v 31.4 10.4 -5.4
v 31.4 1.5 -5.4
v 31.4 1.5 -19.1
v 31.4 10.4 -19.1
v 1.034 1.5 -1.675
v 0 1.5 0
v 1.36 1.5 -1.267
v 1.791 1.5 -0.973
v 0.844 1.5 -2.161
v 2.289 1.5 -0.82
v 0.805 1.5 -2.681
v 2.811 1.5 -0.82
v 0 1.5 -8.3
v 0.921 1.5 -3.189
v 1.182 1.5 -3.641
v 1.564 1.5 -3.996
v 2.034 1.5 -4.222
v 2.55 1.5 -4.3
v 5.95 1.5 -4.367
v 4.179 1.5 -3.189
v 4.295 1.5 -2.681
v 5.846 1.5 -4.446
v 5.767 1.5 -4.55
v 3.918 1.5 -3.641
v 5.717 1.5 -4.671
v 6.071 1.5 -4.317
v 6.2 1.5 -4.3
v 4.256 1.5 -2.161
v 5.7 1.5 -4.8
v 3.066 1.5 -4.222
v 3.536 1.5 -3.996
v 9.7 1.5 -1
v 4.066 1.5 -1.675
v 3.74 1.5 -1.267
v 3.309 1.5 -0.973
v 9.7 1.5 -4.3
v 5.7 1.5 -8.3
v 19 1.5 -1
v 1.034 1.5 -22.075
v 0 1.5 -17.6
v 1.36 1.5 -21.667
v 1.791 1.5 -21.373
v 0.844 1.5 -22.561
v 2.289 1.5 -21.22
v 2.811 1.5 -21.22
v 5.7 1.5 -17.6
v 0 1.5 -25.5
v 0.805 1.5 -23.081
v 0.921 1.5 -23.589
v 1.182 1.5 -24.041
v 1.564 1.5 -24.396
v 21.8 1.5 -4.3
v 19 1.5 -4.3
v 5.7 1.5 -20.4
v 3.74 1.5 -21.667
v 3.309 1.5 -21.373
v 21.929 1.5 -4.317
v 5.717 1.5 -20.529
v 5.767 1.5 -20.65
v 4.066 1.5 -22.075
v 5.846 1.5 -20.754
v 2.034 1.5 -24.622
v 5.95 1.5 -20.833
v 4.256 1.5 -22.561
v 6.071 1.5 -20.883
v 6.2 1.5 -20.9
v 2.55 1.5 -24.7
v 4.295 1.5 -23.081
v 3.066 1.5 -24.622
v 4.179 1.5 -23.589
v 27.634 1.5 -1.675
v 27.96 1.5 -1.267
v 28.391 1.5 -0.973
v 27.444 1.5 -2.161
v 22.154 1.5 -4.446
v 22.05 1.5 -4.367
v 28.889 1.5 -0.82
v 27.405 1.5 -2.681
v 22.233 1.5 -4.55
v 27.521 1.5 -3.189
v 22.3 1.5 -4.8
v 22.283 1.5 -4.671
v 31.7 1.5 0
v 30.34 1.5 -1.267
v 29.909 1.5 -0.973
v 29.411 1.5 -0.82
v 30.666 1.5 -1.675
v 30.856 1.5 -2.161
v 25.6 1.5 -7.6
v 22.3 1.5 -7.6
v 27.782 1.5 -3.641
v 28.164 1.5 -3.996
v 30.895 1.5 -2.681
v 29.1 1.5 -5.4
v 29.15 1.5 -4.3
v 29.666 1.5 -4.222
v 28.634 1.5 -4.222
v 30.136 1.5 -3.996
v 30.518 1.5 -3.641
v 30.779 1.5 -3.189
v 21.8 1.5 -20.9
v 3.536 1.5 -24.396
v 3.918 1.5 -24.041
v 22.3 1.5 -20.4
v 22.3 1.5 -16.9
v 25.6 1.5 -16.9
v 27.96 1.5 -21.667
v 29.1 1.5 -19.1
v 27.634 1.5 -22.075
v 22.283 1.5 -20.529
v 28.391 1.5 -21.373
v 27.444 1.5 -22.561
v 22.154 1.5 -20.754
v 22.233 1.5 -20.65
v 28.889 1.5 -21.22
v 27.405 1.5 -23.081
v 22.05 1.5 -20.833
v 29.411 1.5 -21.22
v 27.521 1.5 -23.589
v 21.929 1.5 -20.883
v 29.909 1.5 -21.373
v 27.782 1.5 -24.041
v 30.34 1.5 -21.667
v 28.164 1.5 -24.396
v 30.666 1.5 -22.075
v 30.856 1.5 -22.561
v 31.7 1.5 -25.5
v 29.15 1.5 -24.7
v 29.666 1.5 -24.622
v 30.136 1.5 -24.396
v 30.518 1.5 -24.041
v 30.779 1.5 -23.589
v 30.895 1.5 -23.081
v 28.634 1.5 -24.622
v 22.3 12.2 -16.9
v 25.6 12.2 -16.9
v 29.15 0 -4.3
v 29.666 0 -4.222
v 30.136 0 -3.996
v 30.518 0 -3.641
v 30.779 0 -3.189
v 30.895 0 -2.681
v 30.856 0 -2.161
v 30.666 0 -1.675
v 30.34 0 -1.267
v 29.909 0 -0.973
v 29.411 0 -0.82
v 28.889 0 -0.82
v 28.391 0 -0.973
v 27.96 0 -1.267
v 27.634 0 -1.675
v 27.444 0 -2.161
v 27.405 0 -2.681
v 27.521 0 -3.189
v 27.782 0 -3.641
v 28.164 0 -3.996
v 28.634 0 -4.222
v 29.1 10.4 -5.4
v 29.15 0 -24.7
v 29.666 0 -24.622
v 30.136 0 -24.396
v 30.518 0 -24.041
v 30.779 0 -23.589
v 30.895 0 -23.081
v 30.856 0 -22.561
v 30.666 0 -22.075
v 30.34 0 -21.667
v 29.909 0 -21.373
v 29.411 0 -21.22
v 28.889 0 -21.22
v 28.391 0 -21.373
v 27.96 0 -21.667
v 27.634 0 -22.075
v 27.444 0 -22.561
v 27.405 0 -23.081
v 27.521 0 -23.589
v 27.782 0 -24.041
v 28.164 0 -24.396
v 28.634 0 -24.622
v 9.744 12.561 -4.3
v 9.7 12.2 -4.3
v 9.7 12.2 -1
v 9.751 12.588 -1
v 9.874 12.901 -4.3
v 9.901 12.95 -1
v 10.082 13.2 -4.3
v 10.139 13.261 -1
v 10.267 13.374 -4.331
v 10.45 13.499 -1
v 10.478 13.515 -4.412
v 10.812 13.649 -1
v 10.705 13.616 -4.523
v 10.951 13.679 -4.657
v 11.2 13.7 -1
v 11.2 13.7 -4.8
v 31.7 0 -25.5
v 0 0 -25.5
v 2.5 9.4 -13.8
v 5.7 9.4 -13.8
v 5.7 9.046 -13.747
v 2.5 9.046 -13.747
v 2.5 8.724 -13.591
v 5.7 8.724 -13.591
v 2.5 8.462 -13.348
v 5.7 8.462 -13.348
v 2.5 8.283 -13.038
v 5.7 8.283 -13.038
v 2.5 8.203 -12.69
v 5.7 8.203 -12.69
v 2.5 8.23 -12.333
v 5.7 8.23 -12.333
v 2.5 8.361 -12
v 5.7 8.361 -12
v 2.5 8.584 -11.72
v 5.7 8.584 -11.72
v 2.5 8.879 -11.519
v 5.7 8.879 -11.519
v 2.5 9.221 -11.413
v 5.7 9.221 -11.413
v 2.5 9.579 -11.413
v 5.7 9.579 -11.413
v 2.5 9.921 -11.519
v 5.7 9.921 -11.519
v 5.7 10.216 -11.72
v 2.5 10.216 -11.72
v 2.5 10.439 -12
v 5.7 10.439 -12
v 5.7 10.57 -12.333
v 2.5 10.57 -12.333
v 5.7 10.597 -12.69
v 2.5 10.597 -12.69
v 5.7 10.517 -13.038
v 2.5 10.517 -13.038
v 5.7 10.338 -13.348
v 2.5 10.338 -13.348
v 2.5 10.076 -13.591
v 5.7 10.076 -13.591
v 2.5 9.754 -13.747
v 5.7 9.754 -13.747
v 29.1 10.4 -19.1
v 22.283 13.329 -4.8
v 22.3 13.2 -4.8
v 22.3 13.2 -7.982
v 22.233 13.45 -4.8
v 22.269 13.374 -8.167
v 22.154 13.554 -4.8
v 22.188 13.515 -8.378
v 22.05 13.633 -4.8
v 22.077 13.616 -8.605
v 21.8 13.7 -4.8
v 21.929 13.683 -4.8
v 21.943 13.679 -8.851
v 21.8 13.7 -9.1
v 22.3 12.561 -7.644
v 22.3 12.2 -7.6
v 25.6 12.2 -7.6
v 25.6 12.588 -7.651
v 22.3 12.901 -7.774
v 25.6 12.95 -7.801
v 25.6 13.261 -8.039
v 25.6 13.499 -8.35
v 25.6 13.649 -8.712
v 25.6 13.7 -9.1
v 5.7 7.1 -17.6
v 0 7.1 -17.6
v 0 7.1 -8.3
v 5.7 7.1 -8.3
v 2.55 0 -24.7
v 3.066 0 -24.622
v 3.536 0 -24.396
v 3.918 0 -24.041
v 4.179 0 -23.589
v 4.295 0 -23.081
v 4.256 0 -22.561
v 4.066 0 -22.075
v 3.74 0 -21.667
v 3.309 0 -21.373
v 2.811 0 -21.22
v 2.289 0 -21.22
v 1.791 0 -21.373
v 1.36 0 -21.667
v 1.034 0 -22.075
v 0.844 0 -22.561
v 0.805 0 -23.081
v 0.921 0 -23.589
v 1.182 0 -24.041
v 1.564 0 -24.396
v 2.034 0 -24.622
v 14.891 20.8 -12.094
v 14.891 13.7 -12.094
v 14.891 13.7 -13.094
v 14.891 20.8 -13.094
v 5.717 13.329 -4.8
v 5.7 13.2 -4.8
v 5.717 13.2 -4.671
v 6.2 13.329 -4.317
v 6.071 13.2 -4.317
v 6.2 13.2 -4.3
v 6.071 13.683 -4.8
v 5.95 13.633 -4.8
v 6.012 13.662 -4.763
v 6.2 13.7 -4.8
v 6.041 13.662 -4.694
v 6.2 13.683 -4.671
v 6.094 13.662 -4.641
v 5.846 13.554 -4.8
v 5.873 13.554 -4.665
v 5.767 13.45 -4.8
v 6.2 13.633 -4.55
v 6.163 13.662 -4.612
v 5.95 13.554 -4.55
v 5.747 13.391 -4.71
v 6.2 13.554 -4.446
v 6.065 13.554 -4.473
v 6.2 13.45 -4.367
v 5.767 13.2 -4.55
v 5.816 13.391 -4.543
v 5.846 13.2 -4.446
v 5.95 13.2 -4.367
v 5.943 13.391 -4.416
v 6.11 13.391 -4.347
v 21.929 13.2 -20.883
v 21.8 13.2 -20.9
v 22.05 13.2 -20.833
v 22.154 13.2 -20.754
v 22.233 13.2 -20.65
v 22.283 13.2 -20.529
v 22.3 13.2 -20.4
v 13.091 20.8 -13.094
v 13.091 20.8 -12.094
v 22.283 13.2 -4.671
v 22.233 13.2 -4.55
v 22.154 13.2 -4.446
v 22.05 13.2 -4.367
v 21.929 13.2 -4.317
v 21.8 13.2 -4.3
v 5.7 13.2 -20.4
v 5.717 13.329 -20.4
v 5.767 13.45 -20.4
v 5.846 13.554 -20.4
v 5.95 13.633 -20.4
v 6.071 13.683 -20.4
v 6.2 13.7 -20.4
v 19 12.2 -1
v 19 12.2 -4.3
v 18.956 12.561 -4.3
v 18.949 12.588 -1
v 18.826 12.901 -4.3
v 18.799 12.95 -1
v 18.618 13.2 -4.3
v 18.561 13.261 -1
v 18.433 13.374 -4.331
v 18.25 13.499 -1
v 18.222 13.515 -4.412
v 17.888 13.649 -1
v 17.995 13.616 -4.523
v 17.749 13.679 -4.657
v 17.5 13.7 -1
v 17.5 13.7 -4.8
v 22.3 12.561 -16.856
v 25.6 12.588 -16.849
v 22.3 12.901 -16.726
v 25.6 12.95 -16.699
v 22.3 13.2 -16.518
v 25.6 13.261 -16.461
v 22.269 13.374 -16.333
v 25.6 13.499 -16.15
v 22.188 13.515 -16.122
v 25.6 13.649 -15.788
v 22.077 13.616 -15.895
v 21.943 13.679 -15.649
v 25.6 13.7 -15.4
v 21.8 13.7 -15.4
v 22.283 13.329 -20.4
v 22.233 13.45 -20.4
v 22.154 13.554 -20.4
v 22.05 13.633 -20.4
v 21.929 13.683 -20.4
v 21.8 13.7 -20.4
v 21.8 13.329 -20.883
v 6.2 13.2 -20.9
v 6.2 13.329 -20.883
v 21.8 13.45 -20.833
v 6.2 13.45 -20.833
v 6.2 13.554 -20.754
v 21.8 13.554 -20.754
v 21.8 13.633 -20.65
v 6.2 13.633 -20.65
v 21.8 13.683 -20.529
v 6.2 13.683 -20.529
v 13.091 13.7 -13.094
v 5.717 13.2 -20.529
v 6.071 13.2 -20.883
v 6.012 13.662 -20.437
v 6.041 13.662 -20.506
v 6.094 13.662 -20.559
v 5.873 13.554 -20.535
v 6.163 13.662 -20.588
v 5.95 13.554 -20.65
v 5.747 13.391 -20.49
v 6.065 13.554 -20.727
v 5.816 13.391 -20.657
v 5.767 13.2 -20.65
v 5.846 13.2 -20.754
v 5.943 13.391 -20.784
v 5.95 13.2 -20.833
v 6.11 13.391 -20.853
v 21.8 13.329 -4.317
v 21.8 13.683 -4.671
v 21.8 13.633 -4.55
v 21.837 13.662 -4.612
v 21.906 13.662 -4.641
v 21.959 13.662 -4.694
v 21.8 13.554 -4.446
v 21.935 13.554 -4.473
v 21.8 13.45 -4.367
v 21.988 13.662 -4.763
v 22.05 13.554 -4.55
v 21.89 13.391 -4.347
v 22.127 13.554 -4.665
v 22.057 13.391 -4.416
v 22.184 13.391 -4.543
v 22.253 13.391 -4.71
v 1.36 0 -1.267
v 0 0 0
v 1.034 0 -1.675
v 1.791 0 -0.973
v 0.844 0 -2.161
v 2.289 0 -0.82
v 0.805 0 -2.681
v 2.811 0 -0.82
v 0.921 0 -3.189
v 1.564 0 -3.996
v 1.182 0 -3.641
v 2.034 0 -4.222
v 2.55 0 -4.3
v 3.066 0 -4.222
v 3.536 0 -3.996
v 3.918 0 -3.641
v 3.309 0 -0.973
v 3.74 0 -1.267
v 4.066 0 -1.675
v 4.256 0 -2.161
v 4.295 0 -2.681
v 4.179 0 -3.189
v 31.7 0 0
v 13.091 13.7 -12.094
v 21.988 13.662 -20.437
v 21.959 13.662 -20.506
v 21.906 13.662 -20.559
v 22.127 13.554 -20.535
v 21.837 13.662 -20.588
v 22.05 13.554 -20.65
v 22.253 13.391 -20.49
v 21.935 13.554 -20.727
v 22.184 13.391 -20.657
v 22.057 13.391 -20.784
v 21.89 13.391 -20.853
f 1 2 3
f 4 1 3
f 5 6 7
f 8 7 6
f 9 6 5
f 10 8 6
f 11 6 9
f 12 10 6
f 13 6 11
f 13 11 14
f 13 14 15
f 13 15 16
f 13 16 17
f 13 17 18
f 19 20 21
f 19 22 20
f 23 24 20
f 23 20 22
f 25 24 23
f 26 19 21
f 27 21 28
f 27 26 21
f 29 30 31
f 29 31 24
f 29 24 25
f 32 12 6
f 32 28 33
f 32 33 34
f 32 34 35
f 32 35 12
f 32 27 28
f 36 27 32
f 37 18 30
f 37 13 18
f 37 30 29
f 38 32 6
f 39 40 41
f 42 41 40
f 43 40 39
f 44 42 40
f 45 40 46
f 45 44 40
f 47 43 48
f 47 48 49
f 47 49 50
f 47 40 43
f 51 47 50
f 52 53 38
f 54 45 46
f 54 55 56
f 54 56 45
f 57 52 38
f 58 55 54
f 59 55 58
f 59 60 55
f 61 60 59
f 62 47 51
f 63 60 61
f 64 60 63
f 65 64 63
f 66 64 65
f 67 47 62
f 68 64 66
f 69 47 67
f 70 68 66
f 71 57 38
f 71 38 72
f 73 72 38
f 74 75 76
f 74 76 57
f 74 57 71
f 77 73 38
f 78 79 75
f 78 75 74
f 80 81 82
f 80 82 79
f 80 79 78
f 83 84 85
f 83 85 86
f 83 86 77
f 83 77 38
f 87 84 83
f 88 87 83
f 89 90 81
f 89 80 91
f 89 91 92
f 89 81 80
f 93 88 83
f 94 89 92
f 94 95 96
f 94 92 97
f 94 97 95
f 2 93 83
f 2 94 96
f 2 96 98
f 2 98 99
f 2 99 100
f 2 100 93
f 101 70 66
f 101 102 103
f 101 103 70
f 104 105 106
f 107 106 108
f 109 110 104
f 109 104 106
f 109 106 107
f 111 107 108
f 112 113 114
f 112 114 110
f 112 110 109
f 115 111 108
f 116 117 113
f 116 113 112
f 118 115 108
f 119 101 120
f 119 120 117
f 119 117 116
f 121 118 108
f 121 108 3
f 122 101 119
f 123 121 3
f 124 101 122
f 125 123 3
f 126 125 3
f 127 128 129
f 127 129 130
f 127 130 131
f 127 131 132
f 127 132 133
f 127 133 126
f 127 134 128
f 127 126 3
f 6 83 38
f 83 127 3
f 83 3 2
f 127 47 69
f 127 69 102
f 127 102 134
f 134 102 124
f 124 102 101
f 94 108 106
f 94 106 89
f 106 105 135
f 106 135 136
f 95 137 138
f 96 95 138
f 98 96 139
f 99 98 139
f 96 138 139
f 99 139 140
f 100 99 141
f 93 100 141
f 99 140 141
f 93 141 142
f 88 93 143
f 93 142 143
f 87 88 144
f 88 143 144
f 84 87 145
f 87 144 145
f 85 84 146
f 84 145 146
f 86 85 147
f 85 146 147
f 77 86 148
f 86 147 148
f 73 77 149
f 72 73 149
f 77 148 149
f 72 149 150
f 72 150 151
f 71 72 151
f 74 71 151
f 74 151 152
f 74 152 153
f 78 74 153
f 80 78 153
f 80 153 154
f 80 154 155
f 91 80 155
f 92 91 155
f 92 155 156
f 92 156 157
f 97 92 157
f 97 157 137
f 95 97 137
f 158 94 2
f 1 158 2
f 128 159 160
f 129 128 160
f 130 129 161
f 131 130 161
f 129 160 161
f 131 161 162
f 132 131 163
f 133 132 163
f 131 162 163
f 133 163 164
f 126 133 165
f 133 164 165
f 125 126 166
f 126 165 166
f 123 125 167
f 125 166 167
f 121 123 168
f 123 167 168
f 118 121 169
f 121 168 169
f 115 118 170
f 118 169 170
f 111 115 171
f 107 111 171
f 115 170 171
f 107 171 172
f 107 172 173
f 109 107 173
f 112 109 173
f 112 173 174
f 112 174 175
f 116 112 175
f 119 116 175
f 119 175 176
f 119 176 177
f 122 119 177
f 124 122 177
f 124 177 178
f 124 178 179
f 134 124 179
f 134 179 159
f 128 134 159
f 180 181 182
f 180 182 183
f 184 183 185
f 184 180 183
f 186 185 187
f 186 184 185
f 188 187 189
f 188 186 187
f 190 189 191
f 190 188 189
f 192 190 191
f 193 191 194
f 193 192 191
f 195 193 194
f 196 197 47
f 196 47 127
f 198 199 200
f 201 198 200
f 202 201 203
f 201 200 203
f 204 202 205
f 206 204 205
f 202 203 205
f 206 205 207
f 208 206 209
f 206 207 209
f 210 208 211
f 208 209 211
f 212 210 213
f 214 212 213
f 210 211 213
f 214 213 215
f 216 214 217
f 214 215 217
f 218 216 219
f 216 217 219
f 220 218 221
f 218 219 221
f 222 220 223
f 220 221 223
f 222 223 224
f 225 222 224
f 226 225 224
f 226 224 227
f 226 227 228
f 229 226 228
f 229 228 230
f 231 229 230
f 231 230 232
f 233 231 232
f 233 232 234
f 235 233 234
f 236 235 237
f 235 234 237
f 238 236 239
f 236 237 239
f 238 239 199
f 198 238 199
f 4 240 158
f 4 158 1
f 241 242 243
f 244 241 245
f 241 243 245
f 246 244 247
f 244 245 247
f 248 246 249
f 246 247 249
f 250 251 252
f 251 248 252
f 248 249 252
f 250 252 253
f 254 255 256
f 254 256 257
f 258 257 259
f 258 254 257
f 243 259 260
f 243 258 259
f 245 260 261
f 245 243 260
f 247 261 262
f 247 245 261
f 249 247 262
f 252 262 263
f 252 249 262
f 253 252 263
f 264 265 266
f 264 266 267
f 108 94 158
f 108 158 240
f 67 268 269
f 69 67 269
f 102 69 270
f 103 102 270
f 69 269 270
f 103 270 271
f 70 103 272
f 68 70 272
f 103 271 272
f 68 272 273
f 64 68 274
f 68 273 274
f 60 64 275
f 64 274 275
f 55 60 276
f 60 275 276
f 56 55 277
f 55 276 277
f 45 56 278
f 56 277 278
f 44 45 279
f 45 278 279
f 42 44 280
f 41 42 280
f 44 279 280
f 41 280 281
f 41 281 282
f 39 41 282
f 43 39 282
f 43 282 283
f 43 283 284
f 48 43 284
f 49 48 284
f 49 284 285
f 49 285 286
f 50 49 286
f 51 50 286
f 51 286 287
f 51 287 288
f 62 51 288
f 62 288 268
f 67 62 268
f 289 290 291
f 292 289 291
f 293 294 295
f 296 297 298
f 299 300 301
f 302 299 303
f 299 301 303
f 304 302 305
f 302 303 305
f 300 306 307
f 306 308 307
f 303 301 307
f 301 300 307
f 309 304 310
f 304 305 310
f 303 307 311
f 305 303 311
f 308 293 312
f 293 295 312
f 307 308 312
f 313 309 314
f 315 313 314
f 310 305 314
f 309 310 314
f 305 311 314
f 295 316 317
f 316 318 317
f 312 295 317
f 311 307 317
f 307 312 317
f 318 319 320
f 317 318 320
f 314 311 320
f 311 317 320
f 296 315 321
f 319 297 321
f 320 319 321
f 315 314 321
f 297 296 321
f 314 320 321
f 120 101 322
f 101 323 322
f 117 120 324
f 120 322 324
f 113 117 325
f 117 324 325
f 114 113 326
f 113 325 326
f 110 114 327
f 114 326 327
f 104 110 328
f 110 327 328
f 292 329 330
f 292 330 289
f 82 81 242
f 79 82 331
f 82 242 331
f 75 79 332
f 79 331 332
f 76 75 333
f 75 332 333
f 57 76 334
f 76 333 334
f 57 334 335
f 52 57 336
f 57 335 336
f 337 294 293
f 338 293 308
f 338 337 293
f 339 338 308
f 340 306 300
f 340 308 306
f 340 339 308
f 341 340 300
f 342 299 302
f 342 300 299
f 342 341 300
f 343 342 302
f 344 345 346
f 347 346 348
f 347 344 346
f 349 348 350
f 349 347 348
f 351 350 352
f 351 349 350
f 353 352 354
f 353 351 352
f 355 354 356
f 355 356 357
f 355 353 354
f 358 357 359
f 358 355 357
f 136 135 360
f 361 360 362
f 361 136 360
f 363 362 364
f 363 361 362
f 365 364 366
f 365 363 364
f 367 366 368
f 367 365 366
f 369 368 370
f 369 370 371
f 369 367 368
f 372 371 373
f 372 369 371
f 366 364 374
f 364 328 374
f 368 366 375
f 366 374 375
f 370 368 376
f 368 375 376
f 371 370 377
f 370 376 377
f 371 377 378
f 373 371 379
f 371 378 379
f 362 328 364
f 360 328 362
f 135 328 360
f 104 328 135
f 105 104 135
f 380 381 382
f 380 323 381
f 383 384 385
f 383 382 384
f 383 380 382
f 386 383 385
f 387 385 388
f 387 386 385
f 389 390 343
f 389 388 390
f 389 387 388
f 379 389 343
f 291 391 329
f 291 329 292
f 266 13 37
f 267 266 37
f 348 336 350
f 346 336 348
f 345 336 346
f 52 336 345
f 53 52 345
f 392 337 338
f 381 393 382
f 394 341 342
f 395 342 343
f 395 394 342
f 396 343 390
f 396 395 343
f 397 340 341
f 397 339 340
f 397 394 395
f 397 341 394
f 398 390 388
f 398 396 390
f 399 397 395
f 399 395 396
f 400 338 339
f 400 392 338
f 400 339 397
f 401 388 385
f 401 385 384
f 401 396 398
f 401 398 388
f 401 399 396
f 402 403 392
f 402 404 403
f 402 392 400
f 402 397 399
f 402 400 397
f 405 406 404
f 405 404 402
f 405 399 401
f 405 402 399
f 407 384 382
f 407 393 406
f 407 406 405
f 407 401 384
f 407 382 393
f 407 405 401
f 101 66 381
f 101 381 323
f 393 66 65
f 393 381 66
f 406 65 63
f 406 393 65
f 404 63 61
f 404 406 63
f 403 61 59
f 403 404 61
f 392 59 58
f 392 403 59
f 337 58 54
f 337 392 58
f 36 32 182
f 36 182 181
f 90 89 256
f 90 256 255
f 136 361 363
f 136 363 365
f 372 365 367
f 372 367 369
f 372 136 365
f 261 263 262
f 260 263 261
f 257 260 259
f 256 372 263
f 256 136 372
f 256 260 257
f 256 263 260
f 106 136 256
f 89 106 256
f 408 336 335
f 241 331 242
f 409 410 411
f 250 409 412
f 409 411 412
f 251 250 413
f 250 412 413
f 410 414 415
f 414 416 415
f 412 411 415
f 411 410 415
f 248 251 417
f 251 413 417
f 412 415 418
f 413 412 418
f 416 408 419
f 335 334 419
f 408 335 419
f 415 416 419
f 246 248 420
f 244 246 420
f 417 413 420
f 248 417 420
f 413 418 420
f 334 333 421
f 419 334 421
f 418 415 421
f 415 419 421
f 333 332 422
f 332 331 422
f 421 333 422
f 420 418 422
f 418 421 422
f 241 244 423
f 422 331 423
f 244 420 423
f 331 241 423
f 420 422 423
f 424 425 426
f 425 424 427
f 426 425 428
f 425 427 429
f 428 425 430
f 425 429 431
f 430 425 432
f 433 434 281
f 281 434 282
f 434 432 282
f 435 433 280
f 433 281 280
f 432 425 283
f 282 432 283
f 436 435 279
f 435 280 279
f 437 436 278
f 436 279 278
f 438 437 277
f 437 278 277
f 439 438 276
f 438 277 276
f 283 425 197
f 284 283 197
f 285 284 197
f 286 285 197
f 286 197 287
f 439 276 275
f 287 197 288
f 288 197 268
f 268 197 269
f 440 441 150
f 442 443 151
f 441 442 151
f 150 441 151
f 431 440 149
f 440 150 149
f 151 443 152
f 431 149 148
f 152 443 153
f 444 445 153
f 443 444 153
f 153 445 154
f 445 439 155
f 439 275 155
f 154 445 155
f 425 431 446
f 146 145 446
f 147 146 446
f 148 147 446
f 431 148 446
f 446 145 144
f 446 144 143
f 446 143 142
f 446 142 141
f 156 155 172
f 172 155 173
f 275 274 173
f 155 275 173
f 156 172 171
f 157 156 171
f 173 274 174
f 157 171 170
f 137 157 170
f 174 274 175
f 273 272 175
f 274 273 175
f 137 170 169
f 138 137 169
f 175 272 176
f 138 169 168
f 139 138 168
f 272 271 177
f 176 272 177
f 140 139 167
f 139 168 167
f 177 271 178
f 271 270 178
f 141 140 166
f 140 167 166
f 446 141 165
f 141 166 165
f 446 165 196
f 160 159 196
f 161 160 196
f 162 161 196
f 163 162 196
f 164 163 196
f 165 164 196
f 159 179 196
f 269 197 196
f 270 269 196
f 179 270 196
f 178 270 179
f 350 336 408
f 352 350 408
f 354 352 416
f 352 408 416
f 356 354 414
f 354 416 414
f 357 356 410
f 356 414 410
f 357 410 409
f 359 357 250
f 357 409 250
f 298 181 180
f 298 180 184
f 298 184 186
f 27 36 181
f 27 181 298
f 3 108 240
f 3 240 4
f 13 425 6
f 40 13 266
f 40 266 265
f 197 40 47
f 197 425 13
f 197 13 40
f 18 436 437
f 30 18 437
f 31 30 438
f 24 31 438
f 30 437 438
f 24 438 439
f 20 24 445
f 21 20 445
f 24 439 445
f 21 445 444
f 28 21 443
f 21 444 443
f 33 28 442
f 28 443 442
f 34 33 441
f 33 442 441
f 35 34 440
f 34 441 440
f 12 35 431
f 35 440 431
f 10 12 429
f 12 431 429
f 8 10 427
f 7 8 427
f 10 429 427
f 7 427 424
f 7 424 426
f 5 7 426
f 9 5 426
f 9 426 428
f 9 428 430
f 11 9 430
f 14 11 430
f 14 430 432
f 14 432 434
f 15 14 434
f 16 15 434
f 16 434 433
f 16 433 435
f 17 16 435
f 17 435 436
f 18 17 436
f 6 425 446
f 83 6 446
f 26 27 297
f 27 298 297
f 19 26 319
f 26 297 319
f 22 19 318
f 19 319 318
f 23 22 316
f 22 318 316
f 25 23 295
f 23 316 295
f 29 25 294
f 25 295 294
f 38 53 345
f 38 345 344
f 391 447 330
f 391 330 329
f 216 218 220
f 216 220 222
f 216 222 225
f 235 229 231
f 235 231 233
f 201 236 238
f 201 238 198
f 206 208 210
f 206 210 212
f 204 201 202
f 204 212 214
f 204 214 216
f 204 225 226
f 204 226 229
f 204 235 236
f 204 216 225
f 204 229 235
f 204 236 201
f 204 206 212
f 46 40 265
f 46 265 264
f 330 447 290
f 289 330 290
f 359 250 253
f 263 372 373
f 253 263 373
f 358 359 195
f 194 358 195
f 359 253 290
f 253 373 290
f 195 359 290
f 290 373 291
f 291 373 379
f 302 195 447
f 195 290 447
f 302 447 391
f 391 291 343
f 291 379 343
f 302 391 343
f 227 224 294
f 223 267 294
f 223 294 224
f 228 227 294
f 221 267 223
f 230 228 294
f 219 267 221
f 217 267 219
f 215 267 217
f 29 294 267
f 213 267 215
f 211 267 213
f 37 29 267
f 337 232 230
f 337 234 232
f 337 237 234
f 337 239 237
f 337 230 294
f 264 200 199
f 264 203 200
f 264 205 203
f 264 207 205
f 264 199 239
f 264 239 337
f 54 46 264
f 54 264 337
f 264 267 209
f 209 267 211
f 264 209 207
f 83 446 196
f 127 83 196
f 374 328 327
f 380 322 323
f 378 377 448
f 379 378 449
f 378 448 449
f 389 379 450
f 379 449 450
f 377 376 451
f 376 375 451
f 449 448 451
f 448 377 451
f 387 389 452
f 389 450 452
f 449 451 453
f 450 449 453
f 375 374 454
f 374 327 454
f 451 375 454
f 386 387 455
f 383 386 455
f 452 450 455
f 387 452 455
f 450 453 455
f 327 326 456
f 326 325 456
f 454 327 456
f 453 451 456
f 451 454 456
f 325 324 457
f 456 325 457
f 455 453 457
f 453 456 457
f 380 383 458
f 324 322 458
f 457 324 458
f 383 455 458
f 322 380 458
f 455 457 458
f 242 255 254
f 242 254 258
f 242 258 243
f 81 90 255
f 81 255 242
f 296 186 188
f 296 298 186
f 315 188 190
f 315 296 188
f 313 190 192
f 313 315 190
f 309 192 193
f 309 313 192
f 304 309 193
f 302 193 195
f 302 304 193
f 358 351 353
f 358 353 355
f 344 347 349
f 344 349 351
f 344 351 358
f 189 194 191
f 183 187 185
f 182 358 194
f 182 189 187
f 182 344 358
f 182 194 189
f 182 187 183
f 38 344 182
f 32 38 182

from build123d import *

# Parameters (mm, degrees)
SKETCH1_W                       = 31.7
SKETCH1_H                       = 25.5
BOSS_EXTRUDE1_DEPTH             = 1.5
F_3_0MM_DOWEL_HOLE1_D           = 3.5
F_3_0MM_DOWEL_HOLE1_ON_FACE_2_D = 3.5
BOSS_EXTRUDE2_DEPTH             = 12.2
SKETCH5_W                       = 2.3
SKETCH5_H                       = 13.7
BOSS_EXTRUDE3_DEPTH             = 8.9
SKETCH6_W                       = 5.7
SKETCH6_H                       = 9.3
BOSS_EXTRUDE4_DEPTH             = 5.6
SKETCH7_R                       = 1.2
BOSS_EXTRUDE5_DEPTH             = 3.2
FILLET2_R                       = 1.5
FILLET1_R                       = 0.5
SKETCH8_W                       = 1.8
SKETCH8_H                       = 1
BOSS_EXTRUDE6_DEPTH             = 7.1


with BuildPart() as part:
    # Sketch1 → Boss-Extrude1 (new body)
    with BuildSketch(Plane(origin=(0, 0, 0), x_dir=(1, 0, 0), z_dir=(0, 1, 0))):
        with Locations((15.85, 12.75)):
            Rectangle(SKETCH1_W, SKETCH1_H)
    extrude(amount=BOSS_EXTRUDE1_DEPTH)

    # Ø3.0mm Dowel Hole1 (through all)
    with Locations(Plane(origin=(2.55, 1.5, -22.95), x_dir=(0, 0, 1), z_dir=(0, 1, 0))):
        with Locations((0, 0), (0, 26.6), (20.4, 26.6), (20.4, 0)):
            Hole(F_3_0MM_DOWEL_HOLE1_D / 2)

    # Ø3.0mm Dowel Hole1 on face 2 (through all)
    with Locations(Plane(origin=(39.661564938, 0, -26.520963617), x_dir=(0, 0, 1), z_dir=(0, 1, 0))):
        with Locations((0, 0)):
            Hole(F_3_0MM_DOWEL_HOLE1_ON_FACE_2_D / 2)

    # Sketch4 → Boss-Extrude2 (add)
    with BuildSketch(Plane(origin=(0, 1.5, 0), x_dir=(1, 0, 0), z_dir=(0, 1, 0))):
        Polygon((5.7, 20.9), (22.3, 20.9), (22.3, 16.9), (25.6, 16.9), (25.6, 7.6), (22.3, 7.6), (22.3, 4.3), (19, 4.3), (19, 1), (9.7, 1), (9.7, 4.3), (5.7, 4.3), align=None)
    extrude(amount=BOSS_EXTRUDE2_DEPTH)

    # Sketch5 → Boss-Extrude3 (add)
    with BuildSketch(Plane(origin=(0, 1.5, 0), x_dir=(1, 0, 0), z_dir=(0, 1, 0))):
        with Locations((30.25, 12.25)):
            Rectangle(SKETCH5_W, SKETCH5_H)
    extrude(amount=BOSS_EXTRUDE3_DEPTH)

    # Sketch6 → Boss-Extrude4 (add)
    with BuildSketch(Plane(origin=(0, 1.5, 0), x_dir=(1, 0, 0), z_dir=(0, 1, 0))):
        with Locations((2.85, 12.95)):
            Rectangle(SKETCH6_W, SKETCH6_H)
    extrude(amount=BOSS_EXTRUDE4_DEPTH)

    # Sketch7 → Boss-Extrude5 (add)
    with BuildSketch(Plane.ZY.offset(-5.7)):
        with Locations(Location((-12.6, 9.4, 0), (0, 0, 180))):
            Circle(SKETCH7_R)
    extrude(amount=BOSS_EXTRUDE5_DEPTH)

    # Fillet2
    fillet2_edges = [part.edges().sort_by_distance(p)[0] for p in [
        (9.7, 13.7, -2.65),
        (19, 13.7, -2.65),
        (23.95, 13.7, -7.6),
        (23.95, 13.7, -16.9),
    ]]
    fillet(fillet2_edges, radius=FILLET2_R)

    # Fillet1
    fillet1_edges = [part.edges().sort_by_distance(p)[0] for p in [
        (5.7, 7.6, -20.9),
        (5.7, 7.6, -4.3),
        (22.3, 7.6, -4.3),
        (22.3, 7.6, -20.9),
        (5.7, 13.7, -12.6),
        (8.45, 13.7, -4.3),
        (19.9, 13.7, -4.3),
        (22.3, 13.7, -6.7),
        (22.3, 13.7, -18.15),
        (14, 13.7, -20.9),
    ]]
    fillet(fillet1_edges, radius=FILLET1_R)

    # Sketch8 → Boss-Extrude6 (add)
    with BuildSketch(Plane(origin=(0, 13.7, 0), x_dir=(1, 0, 0), z_dir=(0, 1, 0))):
        with Locations((13.991138348, 12.593671102)):
            Rectangle(SKETCH8_W, SKETCH8_H)
    extrude(amount=BOSS_EXTRUDE6_DEPTH)


solid = part.part
